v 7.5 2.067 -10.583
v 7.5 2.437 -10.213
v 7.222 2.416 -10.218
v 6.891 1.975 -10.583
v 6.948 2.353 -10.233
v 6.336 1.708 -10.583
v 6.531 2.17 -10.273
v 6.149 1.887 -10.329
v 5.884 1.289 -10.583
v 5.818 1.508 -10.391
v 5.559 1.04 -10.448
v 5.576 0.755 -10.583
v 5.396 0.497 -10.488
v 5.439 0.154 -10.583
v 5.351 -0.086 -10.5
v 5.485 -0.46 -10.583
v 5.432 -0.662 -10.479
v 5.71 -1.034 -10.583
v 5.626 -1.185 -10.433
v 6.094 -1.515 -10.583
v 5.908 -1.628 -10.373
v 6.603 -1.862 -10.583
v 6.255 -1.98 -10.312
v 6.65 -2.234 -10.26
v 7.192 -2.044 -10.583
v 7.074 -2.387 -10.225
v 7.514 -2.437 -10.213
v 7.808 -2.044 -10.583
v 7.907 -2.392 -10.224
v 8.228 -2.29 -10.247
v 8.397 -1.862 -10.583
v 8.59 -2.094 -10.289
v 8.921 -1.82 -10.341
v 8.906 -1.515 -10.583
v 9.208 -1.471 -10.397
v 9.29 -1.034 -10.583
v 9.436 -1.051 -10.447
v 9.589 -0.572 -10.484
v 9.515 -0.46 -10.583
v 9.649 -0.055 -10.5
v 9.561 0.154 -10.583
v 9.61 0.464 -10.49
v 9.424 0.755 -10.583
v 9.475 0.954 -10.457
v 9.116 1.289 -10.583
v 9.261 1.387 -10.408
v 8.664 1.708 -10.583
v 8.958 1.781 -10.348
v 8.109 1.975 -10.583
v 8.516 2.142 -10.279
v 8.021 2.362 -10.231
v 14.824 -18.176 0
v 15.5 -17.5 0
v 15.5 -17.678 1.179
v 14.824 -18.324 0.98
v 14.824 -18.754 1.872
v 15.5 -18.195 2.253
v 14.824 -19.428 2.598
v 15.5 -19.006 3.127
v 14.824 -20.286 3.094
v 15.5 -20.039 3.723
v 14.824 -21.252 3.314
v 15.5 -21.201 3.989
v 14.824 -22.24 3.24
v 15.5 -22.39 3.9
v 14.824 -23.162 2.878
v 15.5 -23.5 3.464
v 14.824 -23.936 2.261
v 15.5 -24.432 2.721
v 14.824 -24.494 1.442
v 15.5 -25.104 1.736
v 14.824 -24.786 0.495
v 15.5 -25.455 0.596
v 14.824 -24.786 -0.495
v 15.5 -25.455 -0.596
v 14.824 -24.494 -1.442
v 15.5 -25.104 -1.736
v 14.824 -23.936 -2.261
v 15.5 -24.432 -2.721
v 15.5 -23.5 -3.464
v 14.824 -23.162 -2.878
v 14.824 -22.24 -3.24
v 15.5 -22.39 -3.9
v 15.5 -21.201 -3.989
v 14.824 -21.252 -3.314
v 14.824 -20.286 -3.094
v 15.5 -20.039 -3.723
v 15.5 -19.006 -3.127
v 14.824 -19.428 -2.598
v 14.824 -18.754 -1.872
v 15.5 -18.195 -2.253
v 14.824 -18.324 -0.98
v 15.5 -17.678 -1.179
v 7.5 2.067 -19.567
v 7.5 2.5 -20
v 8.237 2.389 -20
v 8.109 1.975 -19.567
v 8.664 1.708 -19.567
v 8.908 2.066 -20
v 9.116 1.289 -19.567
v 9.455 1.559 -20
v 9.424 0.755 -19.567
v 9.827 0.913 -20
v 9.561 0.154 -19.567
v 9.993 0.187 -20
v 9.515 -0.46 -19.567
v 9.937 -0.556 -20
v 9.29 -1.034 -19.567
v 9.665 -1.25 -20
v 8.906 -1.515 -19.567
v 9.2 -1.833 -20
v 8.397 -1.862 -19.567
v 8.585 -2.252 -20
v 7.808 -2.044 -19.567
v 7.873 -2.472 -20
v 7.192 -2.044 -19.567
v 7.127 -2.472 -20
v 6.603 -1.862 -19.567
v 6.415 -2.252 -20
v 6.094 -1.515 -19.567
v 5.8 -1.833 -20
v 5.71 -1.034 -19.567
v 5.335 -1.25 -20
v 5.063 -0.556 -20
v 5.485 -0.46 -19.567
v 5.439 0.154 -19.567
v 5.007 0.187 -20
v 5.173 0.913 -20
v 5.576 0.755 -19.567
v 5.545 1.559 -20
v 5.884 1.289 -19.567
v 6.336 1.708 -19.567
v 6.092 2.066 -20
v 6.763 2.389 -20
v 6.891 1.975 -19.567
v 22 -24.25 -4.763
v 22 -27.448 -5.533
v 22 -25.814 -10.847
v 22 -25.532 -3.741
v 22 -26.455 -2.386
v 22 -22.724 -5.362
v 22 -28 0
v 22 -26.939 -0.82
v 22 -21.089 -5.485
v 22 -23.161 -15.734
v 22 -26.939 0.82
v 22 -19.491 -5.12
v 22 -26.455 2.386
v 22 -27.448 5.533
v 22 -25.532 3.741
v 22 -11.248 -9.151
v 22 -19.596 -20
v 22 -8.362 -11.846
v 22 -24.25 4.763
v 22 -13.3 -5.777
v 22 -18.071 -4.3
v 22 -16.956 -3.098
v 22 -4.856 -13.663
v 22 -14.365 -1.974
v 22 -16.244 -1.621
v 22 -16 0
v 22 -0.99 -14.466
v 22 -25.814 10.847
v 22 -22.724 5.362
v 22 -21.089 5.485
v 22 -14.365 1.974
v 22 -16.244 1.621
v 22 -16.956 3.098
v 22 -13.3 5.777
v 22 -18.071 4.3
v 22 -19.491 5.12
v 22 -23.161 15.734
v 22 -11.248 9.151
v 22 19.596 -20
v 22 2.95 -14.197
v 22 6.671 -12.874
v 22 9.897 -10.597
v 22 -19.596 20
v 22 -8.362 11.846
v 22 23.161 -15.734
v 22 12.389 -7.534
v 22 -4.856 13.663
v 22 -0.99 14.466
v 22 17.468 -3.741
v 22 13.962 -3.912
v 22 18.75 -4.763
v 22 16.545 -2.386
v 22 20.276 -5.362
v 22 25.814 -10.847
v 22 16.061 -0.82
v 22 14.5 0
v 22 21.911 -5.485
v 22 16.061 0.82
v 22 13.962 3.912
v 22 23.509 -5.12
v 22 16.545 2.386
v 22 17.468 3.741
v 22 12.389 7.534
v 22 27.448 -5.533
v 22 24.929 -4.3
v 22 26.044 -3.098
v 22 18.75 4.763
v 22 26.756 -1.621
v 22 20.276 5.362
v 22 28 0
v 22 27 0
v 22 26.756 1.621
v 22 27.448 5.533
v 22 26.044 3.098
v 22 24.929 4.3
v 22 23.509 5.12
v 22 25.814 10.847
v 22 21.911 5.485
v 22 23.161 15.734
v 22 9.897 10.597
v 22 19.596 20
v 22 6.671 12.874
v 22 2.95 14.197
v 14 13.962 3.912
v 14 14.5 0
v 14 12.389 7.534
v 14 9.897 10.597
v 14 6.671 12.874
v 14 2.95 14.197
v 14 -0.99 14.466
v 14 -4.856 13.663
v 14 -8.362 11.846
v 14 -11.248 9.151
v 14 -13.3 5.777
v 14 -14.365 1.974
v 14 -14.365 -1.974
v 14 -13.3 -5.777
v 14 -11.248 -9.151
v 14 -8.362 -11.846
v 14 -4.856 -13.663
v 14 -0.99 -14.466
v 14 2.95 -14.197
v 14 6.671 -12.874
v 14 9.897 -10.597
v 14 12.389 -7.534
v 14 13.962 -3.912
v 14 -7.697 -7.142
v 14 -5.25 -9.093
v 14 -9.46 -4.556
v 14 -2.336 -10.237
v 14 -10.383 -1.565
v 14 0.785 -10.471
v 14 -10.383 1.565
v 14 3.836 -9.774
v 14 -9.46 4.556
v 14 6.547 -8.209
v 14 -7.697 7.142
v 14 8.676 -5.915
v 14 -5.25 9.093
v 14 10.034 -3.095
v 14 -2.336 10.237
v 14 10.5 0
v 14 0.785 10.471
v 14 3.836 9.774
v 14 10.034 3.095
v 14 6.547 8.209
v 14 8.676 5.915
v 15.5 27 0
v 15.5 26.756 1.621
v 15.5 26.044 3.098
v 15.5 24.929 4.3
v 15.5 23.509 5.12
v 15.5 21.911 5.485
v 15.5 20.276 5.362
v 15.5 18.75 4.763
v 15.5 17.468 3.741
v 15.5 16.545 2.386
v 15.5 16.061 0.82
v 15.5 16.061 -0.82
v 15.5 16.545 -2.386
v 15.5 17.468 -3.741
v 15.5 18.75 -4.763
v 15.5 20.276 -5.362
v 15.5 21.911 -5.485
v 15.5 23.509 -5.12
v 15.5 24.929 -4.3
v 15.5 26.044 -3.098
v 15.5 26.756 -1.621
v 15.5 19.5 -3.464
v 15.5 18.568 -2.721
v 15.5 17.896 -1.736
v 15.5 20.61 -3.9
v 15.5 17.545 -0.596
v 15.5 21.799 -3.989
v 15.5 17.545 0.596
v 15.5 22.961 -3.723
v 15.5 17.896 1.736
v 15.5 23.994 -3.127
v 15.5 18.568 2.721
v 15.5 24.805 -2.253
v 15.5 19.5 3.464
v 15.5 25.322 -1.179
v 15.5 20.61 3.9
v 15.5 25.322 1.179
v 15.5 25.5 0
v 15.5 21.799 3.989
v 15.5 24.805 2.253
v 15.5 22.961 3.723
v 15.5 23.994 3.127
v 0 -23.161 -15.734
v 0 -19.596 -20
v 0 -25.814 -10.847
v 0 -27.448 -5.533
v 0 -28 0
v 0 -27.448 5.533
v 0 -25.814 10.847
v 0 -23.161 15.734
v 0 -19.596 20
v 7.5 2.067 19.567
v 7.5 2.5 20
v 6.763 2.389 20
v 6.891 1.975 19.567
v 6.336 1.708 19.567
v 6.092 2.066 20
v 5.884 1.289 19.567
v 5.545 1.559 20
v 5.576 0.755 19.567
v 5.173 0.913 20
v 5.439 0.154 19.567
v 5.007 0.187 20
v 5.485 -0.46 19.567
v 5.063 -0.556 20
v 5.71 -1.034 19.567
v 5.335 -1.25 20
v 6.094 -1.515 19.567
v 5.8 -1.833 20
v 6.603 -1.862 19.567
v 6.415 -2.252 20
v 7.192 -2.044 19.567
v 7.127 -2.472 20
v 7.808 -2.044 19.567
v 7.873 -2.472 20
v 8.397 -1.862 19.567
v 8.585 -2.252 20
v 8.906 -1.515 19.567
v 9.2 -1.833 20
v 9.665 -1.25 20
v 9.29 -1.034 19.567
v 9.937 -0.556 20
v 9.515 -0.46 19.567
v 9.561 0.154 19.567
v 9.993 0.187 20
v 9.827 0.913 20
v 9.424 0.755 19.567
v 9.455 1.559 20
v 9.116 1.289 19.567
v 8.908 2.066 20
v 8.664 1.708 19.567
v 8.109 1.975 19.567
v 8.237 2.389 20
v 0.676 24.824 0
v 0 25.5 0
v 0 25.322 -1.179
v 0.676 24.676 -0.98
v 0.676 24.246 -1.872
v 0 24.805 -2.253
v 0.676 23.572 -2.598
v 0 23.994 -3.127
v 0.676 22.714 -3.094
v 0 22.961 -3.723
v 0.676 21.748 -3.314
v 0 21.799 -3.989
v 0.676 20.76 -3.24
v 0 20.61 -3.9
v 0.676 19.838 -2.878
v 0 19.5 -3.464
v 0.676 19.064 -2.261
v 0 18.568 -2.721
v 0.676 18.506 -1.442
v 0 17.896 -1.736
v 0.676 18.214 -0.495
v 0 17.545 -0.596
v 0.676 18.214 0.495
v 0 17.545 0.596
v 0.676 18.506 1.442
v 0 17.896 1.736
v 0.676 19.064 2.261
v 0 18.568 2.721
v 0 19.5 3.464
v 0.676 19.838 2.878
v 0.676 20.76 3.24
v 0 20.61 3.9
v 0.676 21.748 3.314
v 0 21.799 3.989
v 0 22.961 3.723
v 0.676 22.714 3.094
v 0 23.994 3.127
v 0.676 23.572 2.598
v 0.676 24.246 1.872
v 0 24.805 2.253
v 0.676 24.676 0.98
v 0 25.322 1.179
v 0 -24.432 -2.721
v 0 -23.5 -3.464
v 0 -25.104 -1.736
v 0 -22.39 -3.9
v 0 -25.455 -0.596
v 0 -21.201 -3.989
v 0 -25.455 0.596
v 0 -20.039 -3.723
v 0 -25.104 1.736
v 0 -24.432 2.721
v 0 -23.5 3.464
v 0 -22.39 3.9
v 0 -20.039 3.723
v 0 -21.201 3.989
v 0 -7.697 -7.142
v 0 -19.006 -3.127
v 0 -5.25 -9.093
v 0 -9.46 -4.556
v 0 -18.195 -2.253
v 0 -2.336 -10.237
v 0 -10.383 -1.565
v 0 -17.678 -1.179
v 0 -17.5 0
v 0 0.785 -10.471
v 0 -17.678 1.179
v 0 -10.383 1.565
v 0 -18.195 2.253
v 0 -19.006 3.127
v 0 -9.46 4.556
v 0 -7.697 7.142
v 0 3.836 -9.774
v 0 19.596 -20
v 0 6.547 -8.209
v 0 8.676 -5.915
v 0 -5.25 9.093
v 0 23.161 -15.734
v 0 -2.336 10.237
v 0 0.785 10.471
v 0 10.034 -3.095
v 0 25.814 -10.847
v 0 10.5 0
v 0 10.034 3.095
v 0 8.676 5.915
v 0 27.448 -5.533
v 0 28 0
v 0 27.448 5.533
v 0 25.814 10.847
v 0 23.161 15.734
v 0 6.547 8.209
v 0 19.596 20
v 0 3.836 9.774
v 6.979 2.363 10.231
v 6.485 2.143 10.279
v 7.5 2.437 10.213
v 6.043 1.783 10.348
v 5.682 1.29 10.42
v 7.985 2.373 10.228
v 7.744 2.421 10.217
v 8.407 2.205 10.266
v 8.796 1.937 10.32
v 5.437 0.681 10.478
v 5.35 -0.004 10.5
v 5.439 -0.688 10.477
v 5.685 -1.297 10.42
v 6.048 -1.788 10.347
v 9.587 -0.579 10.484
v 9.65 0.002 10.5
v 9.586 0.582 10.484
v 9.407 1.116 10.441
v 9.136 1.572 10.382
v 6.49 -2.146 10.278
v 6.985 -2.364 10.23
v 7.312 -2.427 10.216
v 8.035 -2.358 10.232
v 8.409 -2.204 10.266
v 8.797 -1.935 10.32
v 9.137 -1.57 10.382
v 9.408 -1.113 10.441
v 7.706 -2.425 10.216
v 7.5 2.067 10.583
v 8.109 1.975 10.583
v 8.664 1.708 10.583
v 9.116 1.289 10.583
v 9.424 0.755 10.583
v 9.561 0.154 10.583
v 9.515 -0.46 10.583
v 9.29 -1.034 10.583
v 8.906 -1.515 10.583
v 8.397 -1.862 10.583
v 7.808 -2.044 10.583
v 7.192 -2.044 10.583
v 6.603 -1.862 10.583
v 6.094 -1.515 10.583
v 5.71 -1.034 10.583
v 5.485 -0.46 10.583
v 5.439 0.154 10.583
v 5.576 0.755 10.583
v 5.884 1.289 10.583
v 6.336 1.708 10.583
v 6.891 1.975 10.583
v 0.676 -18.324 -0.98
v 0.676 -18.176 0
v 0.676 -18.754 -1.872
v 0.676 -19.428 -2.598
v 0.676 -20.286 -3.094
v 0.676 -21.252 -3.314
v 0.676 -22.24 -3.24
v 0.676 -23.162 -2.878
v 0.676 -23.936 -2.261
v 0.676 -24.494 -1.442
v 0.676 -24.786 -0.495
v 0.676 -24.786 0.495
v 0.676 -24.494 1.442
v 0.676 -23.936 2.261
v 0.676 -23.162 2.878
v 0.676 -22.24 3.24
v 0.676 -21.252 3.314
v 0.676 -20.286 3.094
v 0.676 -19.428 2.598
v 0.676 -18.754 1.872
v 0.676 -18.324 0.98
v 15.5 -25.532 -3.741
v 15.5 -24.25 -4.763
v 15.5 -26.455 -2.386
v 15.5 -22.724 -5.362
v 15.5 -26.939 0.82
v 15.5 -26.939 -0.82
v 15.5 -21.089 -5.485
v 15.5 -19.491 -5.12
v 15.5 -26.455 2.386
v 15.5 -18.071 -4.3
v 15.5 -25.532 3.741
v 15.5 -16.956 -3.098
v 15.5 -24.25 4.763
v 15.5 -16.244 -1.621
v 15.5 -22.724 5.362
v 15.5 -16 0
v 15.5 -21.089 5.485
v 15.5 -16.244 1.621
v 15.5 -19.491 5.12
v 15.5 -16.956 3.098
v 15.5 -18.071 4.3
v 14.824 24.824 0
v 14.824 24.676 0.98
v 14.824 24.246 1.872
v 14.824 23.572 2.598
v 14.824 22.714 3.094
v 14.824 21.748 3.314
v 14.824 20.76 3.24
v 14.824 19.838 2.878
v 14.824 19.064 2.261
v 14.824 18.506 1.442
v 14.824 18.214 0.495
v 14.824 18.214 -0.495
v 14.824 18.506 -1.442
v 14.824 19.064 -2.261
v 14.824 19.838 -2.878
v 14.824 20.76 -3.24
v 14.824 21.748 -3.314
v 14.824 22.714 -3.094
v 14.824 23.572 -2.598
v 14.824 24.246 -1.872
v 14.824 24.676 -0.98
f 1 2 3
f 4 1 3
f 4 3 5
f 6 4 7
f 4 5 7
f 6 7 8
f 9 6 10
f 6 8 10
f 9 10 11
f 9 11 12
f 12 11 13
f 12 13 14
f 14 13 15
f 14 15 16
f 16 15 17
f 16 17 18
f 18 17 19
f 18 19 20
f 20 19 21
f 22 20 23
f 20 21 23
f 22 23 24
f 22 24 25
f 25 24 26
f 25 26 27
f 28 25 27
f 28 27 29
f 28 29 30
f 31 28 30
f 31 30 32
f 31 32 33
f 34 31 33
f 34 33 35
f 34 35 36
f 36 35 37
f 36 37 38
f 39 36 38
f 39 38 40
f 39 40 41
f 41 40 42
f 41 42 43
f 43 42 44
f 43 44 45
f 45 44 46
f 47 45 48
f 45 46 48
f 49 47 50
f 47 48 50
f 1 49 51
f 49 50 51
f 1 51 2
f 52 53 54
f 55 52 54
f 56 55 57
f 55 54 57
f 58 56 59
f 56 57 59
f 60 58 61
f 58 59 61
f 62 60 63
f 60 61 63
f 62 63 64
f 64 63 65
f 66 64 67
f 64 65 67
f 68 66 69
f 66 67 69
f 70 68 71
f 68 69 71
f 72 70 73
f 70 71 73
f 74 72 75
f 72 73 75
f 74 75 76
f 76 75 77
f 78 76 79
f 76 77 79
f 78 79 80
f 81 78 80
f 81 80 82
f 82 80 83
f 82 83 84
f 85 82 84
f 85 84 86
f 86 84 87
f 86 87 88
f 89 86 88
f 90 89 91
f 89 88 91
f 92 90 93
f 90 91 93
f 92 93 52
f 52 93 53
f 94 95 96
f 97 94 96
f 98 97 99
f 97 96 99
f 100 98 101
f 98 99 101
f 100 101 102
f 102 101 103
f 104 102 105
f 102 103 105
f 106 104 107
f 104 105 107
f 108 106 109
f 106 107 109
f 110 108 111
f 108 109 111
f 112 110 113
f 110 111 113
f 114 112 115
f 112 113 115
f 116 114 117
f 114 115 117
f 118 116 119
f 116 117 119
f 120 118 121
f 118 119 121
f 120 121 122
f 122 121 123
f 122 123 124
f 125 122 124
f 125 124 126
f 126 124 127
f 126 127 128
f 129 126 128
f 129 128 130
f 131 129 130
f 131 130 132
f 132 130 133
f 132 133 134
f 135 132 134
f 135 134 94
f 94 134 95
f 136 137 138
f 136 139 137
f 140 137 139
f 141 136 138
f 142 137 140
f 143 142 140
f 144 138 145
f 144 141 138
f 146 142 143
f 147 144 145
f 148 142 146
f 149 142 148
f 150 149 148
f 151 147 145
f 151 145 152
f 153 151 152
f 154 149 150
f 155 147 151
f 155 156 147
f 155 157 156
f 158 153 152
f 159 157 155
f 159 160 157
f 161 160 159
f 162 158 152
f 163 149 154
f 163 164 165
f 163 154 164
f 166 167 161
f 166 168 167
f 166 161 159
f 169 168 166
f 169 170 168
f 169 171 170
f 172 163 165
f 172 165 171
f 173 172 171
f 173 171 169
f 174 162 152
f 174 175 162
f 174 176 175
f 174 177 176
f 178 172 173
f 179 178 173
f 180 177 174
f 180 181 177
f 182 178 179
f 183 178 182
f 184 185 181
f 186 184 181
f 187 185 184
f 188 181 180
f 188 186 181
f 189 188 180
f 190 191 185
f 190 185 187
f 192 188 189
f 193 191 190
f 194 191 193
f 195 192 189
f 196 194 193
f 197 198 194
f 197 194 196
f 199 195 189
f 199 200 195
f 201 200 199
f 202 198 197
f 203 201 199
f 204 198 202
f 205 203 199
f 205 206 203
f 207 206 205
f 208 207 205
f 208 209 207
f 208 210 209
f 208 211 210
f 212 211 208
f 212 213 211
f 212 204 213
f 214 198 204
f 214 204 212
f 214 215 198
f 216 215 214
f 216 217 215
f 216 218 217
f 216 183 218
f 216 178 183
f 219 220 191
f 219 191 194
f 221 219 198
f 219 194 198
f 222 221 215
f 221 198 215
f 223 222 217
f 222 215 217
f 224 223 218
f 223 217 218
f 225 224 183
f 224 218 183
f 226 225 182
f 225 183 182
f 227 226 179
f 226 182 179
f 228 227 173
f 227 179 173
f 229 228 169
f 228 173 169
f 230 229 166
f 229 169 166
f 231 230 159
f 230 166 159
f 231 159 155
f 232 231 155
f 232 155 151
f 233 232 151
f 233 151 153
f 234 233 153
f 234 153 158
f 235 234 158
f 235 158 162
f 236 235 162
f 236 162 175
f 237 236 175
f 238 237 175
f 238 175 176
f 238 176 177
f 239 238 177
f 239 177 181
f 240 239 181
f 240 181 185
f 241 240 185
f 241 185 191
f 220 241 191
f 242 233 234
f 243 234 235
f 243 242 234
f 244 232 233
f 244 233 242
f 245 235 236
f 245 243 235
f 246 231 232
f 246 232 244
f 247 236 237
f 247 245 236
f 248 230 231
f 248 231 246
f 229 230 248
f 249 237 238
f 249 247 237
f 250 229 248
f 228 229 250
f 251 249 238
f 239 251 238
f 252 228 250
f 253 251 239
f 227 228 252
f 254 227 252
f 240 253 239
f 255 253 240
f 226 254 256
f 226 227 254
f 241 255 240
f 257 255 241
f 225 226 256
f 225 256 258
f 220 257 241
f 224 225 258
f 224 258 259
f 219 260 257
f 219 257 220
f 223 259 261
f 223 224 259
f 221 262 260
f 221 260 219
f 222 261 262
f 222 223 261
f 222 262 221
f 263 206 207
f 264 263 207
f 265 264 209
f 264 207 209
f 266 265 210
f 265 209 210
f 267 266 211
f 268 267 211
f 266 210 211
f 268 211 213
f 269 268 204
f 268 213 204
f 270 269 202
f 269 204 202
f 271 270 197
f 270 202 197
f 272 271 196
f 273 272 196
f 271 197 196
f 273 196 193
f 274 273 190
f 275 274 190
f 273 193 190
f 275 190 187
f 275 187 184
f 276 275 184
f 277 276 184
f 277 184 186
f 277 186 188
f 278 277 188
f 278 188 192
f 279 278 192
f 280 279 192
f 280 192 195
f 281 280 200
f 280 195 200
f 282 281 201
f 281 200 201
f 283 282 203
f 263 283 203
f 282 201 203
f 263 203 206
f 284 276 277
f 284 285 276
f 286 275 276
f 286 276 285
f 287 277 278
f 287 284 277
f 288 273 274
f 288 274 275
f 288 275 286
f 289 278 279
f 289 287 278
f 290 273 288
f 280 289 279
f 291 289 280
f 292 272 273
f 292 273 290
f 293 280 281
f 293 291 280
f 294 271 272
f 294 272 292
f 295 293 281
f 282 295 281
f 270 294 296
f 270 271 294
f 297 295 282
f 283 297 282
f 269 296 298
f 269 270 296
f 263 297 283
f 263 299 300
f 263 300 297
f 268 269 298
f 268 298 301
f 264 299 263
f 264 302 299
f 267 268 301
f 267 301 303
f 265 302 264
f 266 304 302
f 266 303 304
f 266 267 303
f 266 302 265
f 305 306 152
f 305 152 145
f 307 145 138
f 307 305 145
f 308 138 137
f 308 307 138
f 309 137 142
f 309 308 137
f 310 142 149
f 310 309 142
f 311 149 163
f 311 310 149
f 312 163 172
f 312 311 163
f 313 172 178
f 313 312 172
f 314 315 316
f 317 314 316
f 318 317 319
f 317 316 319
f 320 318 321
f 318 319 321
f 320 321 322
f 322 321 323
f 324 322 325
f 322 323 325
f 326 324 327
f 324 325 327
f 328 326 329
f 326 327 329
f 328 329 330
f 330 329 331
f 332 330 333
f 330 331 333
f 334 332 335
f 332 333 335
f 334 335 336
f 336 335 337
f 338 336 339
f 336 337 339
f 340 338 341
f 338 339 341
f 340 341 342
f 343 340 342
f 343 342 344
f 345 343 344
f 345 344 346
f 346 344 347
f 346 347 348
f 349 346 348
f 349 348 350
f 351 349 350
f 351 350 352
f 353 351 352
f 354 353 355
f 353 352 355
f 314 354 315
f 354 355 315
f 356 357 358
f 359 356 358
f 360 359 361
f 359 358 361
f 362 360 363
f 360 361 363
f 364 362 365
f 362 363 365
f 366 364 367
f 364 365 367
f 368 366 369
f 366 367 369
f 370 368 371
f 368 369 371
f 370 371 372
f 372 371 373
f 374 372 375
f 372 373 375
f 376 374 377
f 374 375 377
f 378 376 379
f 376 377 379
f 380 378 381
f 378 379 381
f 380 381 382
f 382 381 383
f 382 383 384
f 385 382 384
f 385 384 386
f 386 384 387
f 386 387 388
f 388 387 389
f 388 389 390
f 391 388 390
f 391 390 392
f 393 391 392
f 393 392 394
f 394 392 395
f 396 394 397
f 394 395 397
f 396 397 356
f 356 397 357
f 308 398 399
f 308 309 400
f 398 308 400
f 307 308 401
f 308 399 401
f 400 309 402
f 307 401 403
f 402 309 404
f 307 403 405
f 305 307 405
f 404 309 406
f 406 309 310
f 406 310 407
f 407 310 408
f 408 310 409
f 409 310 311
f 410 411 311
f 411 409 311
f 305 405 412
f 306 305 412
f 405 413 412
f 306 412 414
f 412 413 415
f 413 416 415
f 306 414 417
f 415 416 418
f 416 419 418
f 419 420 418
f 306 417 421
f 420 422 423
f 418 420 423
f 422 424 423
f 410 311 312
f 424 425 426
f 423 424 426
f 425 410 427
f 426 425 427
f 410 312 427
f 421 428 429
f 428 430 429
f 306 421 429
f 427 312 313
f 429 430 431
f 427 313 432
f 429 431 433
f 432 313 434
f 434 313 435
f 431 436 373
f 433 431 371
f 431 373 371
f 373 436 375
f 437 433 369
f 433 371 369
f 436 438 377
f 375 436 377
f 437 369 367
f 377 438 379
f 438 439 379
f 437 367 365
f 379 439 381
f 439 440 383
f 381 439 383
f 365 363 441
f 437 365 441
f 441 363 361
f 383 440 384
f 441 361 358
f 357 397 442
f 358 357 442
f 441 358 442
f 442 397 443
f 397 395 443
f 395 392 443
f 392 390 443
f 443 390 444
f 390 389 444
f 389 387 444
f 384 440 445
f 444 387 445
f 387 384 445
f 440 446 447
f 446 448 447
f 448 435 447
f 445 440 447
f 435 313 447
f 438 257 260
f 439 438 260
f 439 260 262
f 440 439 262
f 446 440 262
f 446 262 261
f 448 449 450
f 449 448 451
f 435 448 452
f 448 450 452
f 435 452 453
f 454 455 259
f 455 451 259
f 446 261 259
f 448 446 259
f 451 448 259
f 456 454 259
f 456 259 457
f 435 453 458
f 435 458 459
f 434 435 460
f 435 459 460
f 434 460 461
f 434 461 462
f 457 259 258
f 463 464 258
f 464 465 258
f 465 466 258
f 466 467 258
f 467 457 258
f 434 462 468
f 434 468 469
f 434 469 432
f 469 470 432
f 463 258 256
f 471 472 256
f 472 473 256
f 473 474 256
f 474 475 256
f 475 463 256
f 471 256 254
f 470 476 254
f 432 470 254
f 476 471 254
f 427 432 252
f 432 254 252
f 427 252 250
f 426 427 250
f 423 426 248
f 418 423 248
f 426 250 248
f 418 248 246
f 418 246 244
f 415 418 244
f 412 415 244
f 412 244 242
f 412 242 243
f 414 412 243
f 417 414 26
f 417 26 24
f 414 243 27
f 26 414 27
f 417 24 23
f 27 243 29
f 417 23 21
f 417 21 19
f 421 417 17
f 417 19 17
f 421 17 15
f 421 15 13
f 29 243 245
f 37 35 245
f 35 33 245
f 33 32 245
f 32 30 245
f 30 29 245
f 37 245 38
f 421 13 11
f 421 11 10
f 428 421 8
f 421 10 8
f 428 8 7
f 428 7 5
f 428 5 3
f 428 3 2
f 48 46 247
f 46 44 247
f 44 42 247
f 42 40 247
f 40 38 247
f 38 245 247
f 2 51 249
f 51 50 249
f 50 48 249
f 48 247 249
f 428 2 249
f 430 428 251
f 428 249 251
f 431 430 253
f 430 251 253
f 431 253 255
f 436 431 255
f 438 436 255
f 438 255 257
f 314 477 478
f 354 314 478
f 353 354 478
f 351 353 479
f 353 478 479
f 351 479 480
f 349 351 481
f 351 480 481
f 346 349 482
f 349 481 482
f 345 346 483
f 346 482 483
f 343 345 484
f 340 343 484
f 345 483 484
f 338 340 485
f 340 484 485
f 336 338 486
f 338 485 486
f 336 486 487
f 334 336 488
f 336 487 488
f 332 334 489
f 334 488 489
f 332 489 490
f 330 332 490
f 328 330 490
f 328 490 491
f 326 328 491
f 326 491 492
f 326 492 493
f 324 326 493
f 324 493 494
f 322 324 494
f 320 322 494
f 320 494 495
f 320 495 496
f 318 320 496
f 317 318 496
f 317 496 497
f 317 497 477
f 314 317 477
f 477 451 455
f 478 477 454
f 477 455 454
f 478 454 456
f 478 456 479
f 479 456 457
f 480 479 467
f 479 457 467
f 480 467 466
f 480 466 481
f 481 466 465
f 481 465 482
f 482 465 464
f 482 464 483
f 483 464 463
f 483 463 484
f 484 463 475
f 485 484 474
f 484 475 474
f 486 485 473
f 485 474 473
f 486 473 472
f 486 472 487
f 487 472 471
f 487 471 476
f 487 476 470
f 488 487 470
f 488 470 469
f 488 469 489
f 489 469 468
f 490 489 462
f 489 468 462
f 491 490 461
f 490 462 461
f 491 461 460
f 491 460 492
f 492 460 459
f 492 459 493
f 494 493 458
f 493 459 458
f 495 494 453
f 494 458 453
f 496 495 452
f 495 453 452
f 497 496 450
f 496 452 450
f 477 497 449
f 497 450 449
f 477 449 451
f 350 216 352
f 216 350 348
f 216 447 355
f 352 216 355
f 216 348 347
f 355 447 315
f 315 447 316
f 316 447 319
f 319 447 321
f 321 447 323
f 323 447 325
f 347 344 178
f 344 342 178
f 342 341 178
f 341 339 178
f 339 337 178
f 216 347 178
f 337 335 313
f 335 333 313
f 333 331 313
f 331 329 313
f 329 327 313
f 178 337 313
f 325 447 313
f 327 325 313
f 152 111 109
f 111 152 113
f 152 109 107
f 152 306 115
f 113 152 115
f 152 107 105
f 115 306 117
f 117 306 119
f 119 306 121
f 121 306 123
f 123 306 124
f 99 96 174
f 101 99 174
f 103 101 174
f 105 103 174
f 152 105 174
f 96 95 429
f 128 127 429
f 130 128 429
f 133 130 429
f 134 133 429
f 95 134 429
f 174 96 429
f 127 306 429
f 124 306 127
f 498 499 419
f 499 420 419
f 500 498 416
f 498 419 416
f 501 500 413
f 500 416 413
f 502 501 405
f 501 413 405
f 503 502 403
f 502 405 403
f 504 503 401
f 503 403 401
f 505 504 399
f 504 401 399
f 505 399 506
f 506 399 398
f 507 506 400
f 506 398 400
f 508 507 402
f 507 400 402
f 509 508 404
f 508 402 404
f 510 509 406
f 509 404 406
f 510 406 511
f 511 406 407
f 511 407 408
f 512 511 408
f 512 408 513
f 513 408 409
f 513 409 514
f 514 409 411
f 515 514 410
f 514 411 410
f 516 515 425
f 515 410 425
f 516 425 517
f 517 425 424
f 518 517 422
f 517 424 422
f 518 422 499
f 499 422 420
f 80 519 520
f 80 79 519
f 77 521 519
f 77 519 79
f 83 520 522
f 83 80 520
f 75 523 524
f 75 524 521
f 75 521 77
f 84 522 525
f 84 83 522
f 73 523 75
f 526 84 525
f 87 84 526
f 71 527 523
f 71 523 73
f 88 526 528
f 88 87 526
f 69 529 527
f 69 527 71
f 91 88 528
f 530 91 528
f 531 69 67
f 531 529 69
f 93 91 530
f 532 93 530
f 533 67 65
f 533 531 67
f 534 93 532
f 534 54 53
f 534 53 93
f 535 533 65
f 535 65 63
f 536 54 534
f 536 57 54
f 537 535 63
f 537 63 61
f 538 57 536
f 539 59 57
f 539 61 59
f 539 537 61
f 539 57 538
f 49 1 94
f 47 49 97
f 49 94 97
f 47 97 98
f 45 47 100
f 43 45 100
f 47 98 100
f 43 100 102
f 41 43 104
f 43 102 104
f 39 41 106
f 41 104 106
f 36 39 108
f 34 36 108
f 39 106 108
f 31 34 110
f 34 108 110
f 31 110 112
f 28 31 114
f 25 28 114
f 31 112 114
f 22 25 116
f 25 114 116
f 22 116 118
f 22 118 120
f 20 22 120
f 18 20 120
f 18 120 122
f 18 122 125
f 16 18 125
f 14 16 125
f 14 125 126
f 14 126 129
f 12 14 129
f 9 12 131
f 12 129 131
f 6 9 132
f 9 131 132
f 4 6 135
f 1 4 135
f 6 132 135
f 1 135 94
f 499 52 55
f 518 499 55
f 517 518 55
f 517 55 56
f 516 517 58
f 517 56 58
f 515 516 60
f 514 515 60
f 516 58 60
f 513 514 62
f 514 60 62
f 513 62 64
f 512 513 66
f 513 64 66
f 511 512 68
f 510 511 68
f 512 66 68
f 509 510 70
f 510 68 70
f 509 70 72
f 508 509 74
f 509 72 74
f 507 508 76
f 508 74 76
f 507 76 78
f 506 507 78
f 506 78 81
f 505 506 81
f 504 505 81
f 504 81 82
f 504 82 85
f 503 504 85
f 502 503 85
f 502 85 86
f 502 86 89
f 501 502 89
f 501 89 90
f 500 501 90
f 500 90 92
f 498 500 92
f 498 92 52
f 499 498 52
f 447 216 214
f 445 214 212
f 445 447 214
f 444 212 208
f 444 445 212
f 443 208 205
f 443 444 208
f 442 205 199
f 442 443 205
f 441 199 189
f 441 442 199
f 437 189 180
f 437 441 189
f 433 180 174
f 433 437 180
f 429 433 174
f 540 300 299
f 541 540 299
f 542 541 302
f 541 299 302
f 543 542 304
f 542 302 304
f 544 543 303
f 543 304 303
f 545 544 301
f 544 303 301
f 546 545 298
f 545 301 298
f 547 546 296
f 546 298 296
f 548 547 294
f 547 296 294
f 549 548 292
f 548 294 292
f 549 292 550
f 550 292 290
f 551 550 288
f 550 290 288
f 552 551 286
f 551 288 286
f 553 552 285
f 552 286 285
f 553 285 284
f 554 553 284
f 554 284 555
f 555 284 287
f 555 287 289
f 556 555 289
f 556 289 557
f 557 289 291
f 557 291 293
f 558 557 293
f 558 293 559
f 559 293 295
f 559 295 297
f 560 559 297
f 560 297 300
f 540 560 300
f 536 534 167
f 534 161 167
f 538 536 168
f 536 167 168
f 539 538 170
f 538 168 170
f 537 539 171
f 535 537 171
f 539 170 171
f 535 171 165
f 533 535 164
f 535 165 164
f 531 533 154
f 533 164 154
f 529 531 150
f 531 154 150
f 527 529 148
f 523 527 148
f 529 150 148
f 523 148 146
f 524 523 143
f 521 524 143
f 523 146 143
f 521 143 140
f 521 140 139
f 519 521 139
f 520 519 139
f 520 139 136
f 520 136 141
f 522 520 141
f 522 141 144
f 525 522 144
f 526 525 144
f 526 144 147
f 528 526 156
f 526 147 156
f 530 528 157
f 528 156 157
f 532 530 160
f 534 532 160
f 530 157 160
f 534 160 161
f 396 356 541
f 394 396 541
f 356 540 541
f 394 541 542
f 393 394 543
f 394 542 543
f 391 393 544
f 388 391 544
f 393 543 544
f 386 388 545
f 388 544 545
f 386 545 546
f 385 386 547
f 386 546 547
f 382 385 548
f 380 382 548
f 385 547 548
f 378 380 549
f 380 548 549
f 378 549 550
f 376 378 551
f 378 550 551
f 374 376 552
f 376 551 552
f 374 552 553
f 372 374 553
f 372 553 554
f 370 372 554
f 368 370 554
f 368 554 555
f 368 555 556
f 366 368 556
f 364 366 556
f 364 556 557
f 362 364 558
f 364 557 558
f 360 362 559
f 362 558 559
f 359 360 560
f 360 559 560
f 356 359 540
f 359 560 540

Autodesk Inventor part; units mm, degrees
sketch "Sketch_1" plane through (0, 0, 0) normal (0, 0, 1) x (1, 0, 0)
  line L0 (22, 0) -> (0, 0)
  line L1 (0, 28) -> (0, 10.5)
  line L2 (0, 10.5) -> (14, 10.5)
  line L3 (14, 10.5) -> (14, 14.5)
  line L4 (14, 14.5) -> (22, 14.5)
  line L5 (22, 14.5) -> (22, 28)
  line L6 (22, 28) -> (0, 28)
revolve "Revolution1" add sketch "Sketch_1" angle 360 about axis through (22, 0, 0) along (1, 0, 0)
sketch "Sketch_2" plane through (0, 0, 0) normal (1, 0, 0) x (0, 1, 0)
  line L0 (-112, 80) -> (-112, -80)
  line L1 (-112, -80) -> (112, -80)
  line L2 (112, -80) -> (112, 80)
  line L3 (112, 80) -> (-112, 80)
  line L4 (-28, 20) -> (-28, -20)
  line L5 (-28, -20) -> (28, -20)
  line L6 (28, -20) -> (28, 20)
  line L7 (28, 20) -> (-28, 20)
extrude "Extrusion1" cut sketch "Sketch_2" along normal blind 24
sketch "Sketch_3" plane through (0, 0, 0) normal (0, 0, 1) x (1, 0, 0)
  line L0 (22, 21.5) -> (0, 21.5)
  line L1 (0, 21.5) -> (0, 25.5)
  line L2 (0, 25.5) -> (0.6765, 24.8235)
  line L3 (0.6765, 24.8235) -> (14.8235, 24.8235)
  line L4 (14.8235, 24.8235) -> (15.5, 25.5)
  line L5 (15.5, 25.5) -> (15.5, 27)
  line L6 (15.5, 27) -> (22, 27)
  line L7 (22, 27) -> (22, 21.5)
  line L8 (22, 21.5) -> (0, 21.5)
revolve "Revolution2" cut sketch "Sketch_3" angle 360 about axis through (22, 21.5, 0) along (1, 0, 0)
thread "Thread1" size "M8x1.25" class "6H" standard "ISO Metric profile" full length
pattern_linear "Rectangular Pattern1" count 2 spacing 43 along (0, -1, 0) of "Revolution2"
sketch "Sketch_4" plane through (7.5, 0, 0) normal (1, 0, 0) x (0, 0, -1)
  line L0 (-10.15, 0) -> (-20, 0)
  line L1 (-20, 0) -> (-20, 2.5)
  line L2 (-20, 2.5) -> (-19.567, 2.067)
  line L3 (-19.567, 2.067) -> (-10.583, 2.067)
  line L4 (-10.583, 2.067) -> (-10.15, 2.5)
  line L5 (-10.15, 2.5) -> (-10.15, 0)
  line L6 (-10.15, 0) -> (-20, 0)
revolve "Revolution3" cut sketch "Sketch_4" angle 360 about axis through (7.5, 0, 10.15) along (0, 0, -1)
thread "Thread2" size "M5x0.8" class "6H" standard "ISO Metric profile" full length
sketch "Sketch_6" plane through (7.5, 0, 0) normal (1, 0, 0) x (0, 0, -1)
  line L0 (20, 0) -> (10.15, 0)
  line L1 (10.15, 0) -> (10.15, 2.5)
  line L2 (10.15, 2.5) -> (10.583, 2.067)
  line L3 (10.583, 2.067) -> (19.567, 2.067)
  line L4 (19.567, 2.067) -> (20, 2.5)
  line L5 (20, 2.5) -> (20, 0)
  line L6 (20, 0) -> (10.15, 0)
revolve "Revolution4" cut sketch "Sketch_6" angle 360 about axis through (7.5, 0, -20) along (0, 0, -1)
thread "Thread3" size "M5x0.8" class "6H" standard "ISO Metric profile" full length
ref_plane "to_bearings_XY" through (14, 0, 0) normal (1, 0, 0) x (0, 0, -1)
ref_plane "to_bearings_YZ" through (14, 0, 0) normal (0, 0, -1) x (0, 1, 0)
ref_plane "to_bearings_ZX" through (14, 0, 0) normal (0, 1, 0) x (1, 0, 0)
ref_plane "to_screw1_XY" through (7.5, 0, 10.5) normal (0, 0, 1) x (1, 0, 0)
ref_plane "to_screw1_YZ" through (7.5, 0, 10.5) normal (1, 0, 0) x (0, 1, 0)
ref_plane "to_screw1_ZX" through (7.5, 0, 10.5) normal (0, 1, 0) x (0, 0, 1)
ref_plane "to_screw2_XY" through (7.5, 0, -10.5) normal (0, 0, -1) x (1, 0, 0)
ref_plane "to_screw2_YZ" through (7.5, 0, -10.5) normal (1, 0, 0) x (0, -1, 0)
ref_plane "to_screw2_ZX" through (7.5, 0, -10.5) normal (0, -1, 0) x (0, 0, -1)
properties part number "BGCSB9_h"
